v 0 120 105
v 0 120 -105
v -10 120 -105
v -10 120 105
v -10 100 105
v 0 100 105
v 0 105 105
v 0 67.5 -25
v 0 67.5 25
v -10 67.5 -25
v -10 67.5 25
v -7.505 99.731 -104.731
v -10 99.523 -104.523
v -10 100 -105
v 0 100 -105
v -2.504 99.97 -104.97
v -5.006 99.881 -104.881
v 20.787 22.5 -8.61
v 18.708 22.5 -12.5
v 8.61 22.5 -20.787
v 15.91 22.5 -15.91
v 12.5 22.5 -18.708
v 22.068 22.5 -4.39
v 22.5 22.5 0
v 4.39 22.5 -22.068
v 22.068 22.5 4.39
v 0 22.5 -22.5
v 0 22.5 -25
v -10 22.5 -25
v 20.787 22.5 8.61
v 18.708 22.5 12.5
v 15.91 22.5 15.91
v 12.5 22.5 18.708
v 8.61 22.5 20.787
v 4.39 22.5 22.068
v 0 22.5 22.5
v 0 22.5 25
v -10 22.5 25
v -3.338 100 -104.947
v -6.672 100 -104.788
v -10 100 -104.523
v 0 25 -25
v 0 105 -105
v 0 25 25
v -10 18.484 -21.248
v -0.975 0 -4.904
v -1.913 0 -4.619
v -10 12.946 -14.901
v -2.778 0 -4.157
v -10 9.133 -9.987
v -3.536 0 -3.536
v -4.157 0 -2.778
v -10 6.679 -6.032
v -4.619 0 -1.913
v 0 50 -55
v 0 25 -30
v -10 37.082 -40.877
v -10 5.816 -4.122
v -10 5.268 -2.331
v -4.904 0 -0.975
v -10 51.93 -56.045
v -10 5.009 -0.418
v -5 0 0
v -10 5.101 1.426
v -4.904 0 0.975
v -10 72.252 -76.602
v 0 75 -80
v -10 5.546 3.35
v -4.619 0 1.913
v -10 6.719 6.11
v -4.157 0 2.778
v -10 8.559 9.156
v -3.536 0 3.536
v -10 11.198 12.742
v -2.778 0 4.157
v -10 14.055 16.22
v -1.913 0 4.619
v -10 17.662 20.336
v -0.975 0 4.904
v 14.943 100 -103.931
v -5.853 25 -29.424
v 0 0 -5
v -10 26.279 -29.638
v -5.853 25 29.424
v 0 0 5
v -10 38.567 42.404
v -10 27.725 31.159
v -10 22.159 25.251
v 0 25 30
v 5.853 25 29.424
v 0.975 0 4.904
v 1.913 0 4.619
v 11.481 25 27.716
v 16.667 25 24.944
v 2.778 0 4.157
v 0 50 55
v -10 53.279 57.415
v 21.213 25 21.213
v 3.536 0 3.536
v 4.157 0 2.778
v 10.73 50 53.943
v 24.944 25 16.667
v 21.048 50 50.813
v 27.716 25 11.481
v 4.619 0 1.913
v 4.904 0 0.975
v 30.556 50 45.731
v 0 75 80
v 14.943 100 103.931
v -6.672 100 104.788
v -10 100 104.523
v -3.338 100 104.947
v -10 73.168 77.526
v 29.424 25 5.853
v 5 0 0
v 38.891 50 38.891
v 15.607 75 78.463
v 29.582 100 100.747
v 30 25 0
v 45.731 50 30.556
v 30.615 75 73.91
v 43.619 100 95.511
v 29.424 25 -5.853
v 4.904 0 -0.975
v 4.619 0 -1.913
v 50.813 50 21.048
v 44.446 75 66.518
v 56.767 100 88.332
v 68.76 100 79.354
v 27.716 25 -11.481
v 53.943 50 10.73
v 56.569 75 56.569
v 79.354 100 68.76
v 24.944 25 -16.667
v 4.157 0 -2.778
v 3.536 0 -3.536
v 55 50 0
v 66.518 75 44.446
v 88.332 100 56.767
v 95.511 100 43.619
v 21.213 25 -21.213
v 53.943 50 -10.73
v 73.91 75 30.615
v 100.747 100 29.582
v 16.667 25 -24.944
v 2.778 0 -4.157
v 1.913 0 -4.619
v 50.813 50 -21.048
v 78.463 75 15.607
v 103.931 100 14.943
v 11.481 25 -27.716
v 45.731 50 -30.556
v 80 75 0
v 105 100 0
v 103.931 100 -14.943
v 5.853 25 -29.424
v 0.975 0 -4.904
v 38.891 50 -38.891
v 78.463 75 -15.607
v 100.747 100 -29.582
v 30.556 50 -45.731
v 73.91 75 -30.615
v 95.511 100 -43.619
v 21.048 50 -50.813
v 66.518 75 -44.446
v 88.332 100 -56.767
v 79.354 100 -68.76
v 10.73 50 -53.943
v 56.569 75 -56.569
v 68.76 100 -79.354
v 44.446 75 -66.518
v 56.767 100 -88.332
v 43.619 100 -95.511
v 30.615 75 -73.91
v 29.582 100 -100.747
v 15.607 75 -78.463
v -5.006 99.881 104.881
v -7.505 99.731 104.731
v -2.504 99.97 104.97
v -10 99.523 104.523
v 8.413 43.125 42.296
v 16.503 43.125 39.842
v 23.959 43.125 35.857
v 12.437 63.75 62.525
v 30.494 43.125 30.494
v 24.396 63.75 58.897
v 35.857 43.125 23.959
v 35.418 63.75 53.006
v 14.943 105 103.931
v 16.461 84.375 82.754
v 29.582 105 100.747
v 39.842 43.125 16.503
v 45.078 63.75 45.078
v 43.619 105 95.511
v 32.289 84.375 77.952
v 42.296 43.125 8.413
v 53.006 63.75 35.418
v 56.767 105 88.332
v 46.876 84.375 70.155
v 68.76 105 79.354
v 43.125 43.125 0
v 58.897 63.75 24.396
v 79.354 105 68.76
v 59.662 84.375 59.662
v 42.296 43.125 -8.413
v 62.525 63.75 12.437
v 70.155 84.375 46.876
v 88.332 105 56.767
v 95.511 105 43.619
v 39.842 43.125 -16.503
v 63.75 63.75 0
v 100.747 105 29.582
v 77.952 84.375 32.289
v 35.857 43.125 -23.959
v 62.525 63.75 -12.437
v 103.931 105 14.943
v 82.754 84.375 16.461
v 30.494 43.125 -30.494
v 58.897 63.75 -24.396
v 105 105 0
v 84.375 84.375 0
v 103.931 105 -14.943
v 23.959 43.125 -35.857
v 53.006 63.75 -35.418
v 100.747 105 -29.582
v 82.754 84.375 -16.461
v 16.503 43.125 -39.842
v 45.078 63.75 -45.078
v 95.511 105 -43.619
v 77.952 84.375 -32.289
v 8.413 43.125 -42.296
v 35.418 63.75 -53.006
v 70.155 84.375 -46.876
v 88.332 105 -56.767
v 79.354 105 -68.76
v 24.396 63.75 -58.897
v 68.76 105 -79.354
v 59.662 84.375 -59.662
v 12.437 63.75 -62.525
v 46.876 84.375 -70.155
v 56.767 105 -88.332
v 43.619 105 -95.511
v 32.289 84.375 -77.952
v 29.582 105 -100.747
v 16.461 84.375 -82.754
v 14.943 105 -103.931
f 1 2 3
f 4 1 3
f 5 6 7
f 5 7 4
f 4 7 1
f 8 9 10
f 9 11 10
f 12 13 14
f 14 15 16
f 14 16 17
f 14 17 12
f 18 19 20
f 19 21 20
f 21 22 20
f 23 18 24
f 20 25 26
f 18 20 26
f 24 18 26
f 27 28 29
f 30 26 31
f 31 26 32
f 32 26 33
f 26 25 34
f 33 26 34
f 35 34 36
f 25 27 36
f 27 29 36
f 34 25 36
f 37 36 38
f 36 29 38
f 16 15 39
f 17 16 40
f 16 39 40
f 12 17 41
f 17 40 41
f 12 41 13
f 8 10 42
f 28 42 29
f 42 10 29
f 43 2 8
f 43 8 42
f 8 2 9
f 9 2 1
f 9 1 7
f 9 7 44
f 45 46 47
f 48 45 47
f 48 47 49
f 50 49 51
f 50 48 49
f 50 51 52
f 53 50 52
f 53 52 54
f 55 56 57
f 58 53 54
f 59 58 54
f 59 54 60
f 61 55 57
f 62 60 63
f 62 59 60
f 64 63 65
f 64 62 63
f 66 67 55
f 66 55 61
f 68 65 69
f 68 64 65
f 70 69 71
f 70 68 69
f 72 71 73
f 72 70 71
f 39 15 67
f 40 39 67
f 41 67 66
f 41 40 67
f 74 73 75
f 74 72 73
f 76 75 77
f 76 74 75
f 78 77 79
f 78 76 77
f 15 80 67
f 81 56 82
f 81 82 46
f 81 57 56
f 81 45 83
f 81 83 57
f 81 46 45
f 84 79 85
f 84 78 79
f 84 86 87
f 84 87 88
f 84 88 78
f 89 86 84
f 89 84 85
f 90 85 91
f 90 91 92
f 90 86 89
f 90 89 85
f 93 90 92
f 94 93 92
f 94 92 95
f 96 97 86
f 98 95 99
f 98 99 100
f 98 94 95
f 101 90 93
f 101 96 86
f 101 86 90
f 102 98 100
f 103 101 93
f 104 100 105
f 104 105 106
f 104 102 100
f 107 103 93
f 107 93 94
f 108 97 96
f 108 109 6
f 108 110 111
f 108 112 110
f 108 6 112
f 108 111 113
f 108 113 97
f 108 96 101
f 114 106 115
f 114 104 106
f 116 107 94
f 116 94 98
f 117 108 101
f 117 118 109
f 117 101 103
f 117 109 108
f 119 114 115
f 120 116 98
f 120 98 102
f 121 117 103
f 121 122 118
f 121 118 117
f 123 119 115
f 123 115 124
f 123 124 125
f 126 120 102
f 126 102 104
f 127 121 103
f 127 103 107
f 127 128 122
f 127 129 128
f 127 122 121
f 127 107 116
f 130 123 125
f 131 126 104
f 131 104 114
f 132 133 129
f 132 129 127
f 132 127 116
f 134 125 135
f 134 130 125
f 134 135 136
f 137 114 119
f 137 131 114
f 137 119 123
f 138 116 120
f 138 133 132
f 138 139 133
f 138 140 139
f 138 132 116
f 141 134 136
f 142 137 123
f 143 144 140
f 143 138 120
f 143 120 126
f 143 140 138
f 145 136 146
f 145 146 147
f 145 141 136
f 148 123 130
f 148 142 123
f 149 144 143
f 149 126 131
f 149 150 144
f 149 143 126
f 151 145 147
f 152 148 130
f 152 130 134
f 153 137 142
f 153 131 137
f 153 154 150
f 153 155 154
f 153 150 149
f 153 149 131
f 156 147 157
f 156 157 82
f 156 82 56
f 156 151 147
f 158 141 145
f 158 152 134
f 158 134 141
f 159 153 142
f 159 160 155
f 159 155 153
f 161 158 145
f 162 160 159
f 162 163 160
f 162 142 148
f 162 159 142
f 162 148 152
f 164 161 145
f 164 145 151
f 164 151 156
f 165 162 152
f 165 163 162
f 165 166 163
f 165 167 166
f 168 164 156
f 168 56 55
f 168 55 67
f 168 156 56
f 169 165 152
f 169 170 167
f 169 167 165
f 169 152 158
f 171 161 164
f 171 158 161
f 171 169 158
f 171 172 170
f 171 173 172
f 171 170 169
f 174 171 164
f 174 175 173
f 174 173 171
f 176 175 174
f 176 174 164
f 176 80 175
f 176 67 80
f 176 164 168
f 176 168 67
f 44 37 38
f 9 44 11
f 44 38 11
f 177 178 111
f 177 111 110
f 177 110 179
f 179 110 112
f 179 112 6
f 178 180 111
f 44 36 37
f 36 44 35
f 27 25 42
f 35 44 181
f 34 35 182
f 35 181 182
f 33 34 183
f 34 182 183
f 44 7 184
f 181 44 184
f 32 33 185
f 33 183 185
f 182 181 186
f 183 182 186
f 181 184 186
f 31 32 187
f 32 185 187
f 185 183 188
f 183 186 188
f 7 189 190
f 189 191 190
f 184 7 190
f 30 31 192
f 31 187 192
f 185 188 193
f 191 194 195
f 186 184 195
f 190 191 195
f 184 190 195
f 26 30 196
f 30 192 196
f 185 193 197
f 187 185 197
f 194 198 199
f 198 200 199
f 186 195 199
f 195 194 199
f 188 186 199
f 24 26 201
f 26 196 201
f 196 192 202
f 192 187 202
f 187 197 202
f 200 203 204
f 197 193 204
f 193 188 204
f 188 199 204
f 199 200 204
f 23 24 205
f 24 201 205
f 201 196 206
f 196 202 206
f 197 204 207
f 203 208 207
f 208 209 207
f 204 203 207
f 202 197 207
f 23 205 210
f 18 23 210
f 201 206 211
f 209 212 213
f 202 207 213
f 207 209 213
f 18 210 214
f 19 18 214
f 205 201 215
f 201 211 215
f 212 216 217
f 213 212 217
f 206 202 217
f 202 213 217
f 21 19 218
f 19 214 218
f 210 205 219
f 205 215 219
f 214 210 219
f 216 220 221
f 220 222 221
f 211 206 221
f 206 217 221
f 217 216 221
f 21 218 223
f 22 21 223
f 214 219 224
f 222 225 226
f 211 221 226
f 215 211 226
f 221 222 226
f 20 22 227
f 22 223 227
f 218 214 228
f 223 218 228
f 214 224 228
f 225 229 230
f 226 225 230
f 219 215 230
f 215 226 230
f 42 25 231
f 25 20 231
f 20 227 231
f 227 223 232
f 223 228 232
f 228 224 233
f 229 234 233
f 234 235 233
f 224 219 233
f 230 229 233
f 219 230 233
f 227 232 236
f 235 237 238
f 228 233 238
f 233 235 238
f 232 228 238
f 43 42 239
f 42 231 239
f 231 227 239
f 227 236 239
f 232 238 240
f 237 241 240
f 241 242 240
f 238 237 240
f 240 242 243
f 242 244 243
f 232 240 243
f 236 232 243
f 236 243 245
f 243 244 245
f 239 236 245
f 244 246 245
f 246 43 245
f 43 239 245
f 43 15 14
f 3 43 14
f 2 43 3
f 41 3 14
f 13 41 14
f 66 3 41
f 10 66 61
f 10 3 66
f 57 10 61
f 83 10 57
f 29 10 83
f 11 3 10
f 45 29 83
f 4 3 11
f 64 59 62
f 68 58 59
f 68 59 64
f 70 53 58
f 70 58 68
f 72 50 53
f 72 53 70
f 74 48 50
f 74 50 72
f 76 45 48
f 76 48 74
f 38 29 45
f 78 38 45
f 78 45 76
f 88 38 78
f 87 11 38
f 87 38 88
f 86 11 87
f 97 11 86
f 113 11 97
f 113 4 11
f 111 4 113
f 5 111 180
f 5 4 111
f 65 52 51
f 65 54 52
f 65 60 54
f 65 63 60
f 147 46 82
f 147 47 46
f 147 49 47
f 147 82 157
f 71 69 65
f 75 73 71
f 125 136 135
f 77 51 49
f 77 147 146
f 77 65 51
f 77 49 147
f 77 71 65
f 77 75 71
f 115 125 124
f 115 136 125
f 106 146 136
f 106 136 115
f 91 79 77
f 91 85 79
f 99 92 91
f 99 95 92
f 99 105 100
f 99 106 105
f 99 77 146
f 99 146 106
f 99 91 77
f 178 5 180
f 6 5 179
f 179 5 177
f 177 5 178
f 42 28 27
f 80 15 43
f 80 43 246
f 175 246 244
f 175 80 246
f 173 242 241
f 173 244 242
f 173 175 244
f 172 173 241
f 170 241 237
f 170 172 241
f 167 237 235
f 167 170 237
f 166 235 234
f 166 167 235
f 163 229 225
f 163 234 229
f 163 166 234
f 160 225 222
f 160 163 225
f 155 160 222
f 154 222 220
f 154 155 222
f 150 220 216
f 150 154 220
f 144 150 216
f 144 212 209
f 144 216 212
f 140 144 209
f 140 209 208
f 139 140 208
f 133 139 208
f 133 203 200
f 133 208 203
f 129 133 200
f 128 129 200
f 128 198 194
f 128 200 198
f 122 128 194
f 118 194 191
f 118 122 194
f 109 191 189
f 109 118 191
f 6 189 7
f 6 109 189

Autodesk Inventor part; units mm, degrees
ref_plane "YZ Plane" through (0, 0, 0) normal (1, 0, 0) x (0, 1, 0)
ref_plane "XZ Plane" through (0, 0, 0) normal (0, 1, 0) x (-1, 0, 0)
sketch "Sketch1" plane through (0, 0, 0) normal (0, 0, 1) x (1, 0, 0)
  line L0 (0, 0) -> (5, 0)
  line L1 (5, 0) -> (105, 0)
  line L2 (105, 0) -> (105, 100)
  line L3 (105, 100) -> (5, 0)
  line L4 (0, 0) -> (105, 105)
  line L5 (105, 105) -> (105, 100)
  line L6 (0, 0) -> (0, 120) construction
  dimension "d0" = 5
  dimension "d1" = 100
  dimension "d2" = 100
  dimension "d3" = 120
revolve "Revolution1" add sketch "Sketch1" angle 360 about axis through (0, 0, 0) along (0, 1, 0) contours L4 L5 L3 L0
ref_plane "Work Plane1" through (0, 0, 0) normal (0, 0, -1) x (0, 1, 0)
sketch "Sketch2" plane through (0, 0, 0) normal (0, 0, -1) x (0, 1, 0)
  line L0 (120, 0) -> (120, -10)
  line L1 (120, -10) -> (0, -10)
  line L2 (0, -10) -> (0, 0)
  line L3 (120, -10) -> (120, -110)
  line L4 (120, -110) -> (0, -110)
  line L5 (0, -110) -> (0, -10)
  line L6 (120, 0) -> (0, 0)
  dimension "d5" = 10
  dimension "d6" = 120
  dimension "d7" = 10
  dimension "d8" = 100
extrude "Extrusion1" cut sketch "Sketch2" along normal through all both and the other way through all contours L3 L4 L5 L1
extrude "Extrusion2" add sketch "Sketch2" along normal mid plane 210 contours L0 L1 L2 L6
sketch "Sketch3" plane through (0, 0, 105) normal (1, 0, 0) x (0, 0, -1)
  line L0 (0, 100) -> (100, 0) projected
  line L1 (0, 0) -> (0, 100) projected
  line L2 (100, 0) -> (0, 0) projected
  line L3 (110, 0) -> (210, 100) projected
  line L4 (210, 0) -> (110, 0) projected
  line L5 (210, 100) -> (210, 0) projected
  point P0 (105, 0)
extrude "Extrusion3" cut sketch "Sketch3" against normal through all
sketch "Sketch4" plane through (-10, 120, -105) normal (-1, 0, 0) x (0, 0, 1)
  line L0 (105, -120) -> (105, -75)
  line L1 (130, -52.5) -> (80, -52.5)
  line L2 (80, -52.5) -> (80, -97.5)
  line L3 (80, -97.5) -> (130, -97.5)
  line L4 (130, -97.5) -> (130, -52.5)
  line L5 (130, -52.5) -> (80, -97.5) construction
  line L6 (80, -52.5) -> (130, -97.5) construction
  dimension "d15" = 45
  dimension "d16" = 50
  dimension "d17" = 45
extrude "Extrusion4" cut sketch "Sketch4" against normal blind 10
sketch "Sketch5" plane through (0, 22.5, 22.5) normal (1, 0, 0) x (0, 0, -1)
  line L0 (45, 0) -> (0, 0) projected
  line L1 (127.5, 82.5) -> (22.5, -22.5) projected
  line L2 (22.5, -22.5) -> (0, 0) projected
extrude "Extrusion5" add sketch "Sketch5" along normal blind 25
revolve "Revolution2" cut sketch "Sketch1" angle 360 about axis through (0, 0, 0) along (0, 1, 0) contours L3 L2 L1
properties part number "Collector"
